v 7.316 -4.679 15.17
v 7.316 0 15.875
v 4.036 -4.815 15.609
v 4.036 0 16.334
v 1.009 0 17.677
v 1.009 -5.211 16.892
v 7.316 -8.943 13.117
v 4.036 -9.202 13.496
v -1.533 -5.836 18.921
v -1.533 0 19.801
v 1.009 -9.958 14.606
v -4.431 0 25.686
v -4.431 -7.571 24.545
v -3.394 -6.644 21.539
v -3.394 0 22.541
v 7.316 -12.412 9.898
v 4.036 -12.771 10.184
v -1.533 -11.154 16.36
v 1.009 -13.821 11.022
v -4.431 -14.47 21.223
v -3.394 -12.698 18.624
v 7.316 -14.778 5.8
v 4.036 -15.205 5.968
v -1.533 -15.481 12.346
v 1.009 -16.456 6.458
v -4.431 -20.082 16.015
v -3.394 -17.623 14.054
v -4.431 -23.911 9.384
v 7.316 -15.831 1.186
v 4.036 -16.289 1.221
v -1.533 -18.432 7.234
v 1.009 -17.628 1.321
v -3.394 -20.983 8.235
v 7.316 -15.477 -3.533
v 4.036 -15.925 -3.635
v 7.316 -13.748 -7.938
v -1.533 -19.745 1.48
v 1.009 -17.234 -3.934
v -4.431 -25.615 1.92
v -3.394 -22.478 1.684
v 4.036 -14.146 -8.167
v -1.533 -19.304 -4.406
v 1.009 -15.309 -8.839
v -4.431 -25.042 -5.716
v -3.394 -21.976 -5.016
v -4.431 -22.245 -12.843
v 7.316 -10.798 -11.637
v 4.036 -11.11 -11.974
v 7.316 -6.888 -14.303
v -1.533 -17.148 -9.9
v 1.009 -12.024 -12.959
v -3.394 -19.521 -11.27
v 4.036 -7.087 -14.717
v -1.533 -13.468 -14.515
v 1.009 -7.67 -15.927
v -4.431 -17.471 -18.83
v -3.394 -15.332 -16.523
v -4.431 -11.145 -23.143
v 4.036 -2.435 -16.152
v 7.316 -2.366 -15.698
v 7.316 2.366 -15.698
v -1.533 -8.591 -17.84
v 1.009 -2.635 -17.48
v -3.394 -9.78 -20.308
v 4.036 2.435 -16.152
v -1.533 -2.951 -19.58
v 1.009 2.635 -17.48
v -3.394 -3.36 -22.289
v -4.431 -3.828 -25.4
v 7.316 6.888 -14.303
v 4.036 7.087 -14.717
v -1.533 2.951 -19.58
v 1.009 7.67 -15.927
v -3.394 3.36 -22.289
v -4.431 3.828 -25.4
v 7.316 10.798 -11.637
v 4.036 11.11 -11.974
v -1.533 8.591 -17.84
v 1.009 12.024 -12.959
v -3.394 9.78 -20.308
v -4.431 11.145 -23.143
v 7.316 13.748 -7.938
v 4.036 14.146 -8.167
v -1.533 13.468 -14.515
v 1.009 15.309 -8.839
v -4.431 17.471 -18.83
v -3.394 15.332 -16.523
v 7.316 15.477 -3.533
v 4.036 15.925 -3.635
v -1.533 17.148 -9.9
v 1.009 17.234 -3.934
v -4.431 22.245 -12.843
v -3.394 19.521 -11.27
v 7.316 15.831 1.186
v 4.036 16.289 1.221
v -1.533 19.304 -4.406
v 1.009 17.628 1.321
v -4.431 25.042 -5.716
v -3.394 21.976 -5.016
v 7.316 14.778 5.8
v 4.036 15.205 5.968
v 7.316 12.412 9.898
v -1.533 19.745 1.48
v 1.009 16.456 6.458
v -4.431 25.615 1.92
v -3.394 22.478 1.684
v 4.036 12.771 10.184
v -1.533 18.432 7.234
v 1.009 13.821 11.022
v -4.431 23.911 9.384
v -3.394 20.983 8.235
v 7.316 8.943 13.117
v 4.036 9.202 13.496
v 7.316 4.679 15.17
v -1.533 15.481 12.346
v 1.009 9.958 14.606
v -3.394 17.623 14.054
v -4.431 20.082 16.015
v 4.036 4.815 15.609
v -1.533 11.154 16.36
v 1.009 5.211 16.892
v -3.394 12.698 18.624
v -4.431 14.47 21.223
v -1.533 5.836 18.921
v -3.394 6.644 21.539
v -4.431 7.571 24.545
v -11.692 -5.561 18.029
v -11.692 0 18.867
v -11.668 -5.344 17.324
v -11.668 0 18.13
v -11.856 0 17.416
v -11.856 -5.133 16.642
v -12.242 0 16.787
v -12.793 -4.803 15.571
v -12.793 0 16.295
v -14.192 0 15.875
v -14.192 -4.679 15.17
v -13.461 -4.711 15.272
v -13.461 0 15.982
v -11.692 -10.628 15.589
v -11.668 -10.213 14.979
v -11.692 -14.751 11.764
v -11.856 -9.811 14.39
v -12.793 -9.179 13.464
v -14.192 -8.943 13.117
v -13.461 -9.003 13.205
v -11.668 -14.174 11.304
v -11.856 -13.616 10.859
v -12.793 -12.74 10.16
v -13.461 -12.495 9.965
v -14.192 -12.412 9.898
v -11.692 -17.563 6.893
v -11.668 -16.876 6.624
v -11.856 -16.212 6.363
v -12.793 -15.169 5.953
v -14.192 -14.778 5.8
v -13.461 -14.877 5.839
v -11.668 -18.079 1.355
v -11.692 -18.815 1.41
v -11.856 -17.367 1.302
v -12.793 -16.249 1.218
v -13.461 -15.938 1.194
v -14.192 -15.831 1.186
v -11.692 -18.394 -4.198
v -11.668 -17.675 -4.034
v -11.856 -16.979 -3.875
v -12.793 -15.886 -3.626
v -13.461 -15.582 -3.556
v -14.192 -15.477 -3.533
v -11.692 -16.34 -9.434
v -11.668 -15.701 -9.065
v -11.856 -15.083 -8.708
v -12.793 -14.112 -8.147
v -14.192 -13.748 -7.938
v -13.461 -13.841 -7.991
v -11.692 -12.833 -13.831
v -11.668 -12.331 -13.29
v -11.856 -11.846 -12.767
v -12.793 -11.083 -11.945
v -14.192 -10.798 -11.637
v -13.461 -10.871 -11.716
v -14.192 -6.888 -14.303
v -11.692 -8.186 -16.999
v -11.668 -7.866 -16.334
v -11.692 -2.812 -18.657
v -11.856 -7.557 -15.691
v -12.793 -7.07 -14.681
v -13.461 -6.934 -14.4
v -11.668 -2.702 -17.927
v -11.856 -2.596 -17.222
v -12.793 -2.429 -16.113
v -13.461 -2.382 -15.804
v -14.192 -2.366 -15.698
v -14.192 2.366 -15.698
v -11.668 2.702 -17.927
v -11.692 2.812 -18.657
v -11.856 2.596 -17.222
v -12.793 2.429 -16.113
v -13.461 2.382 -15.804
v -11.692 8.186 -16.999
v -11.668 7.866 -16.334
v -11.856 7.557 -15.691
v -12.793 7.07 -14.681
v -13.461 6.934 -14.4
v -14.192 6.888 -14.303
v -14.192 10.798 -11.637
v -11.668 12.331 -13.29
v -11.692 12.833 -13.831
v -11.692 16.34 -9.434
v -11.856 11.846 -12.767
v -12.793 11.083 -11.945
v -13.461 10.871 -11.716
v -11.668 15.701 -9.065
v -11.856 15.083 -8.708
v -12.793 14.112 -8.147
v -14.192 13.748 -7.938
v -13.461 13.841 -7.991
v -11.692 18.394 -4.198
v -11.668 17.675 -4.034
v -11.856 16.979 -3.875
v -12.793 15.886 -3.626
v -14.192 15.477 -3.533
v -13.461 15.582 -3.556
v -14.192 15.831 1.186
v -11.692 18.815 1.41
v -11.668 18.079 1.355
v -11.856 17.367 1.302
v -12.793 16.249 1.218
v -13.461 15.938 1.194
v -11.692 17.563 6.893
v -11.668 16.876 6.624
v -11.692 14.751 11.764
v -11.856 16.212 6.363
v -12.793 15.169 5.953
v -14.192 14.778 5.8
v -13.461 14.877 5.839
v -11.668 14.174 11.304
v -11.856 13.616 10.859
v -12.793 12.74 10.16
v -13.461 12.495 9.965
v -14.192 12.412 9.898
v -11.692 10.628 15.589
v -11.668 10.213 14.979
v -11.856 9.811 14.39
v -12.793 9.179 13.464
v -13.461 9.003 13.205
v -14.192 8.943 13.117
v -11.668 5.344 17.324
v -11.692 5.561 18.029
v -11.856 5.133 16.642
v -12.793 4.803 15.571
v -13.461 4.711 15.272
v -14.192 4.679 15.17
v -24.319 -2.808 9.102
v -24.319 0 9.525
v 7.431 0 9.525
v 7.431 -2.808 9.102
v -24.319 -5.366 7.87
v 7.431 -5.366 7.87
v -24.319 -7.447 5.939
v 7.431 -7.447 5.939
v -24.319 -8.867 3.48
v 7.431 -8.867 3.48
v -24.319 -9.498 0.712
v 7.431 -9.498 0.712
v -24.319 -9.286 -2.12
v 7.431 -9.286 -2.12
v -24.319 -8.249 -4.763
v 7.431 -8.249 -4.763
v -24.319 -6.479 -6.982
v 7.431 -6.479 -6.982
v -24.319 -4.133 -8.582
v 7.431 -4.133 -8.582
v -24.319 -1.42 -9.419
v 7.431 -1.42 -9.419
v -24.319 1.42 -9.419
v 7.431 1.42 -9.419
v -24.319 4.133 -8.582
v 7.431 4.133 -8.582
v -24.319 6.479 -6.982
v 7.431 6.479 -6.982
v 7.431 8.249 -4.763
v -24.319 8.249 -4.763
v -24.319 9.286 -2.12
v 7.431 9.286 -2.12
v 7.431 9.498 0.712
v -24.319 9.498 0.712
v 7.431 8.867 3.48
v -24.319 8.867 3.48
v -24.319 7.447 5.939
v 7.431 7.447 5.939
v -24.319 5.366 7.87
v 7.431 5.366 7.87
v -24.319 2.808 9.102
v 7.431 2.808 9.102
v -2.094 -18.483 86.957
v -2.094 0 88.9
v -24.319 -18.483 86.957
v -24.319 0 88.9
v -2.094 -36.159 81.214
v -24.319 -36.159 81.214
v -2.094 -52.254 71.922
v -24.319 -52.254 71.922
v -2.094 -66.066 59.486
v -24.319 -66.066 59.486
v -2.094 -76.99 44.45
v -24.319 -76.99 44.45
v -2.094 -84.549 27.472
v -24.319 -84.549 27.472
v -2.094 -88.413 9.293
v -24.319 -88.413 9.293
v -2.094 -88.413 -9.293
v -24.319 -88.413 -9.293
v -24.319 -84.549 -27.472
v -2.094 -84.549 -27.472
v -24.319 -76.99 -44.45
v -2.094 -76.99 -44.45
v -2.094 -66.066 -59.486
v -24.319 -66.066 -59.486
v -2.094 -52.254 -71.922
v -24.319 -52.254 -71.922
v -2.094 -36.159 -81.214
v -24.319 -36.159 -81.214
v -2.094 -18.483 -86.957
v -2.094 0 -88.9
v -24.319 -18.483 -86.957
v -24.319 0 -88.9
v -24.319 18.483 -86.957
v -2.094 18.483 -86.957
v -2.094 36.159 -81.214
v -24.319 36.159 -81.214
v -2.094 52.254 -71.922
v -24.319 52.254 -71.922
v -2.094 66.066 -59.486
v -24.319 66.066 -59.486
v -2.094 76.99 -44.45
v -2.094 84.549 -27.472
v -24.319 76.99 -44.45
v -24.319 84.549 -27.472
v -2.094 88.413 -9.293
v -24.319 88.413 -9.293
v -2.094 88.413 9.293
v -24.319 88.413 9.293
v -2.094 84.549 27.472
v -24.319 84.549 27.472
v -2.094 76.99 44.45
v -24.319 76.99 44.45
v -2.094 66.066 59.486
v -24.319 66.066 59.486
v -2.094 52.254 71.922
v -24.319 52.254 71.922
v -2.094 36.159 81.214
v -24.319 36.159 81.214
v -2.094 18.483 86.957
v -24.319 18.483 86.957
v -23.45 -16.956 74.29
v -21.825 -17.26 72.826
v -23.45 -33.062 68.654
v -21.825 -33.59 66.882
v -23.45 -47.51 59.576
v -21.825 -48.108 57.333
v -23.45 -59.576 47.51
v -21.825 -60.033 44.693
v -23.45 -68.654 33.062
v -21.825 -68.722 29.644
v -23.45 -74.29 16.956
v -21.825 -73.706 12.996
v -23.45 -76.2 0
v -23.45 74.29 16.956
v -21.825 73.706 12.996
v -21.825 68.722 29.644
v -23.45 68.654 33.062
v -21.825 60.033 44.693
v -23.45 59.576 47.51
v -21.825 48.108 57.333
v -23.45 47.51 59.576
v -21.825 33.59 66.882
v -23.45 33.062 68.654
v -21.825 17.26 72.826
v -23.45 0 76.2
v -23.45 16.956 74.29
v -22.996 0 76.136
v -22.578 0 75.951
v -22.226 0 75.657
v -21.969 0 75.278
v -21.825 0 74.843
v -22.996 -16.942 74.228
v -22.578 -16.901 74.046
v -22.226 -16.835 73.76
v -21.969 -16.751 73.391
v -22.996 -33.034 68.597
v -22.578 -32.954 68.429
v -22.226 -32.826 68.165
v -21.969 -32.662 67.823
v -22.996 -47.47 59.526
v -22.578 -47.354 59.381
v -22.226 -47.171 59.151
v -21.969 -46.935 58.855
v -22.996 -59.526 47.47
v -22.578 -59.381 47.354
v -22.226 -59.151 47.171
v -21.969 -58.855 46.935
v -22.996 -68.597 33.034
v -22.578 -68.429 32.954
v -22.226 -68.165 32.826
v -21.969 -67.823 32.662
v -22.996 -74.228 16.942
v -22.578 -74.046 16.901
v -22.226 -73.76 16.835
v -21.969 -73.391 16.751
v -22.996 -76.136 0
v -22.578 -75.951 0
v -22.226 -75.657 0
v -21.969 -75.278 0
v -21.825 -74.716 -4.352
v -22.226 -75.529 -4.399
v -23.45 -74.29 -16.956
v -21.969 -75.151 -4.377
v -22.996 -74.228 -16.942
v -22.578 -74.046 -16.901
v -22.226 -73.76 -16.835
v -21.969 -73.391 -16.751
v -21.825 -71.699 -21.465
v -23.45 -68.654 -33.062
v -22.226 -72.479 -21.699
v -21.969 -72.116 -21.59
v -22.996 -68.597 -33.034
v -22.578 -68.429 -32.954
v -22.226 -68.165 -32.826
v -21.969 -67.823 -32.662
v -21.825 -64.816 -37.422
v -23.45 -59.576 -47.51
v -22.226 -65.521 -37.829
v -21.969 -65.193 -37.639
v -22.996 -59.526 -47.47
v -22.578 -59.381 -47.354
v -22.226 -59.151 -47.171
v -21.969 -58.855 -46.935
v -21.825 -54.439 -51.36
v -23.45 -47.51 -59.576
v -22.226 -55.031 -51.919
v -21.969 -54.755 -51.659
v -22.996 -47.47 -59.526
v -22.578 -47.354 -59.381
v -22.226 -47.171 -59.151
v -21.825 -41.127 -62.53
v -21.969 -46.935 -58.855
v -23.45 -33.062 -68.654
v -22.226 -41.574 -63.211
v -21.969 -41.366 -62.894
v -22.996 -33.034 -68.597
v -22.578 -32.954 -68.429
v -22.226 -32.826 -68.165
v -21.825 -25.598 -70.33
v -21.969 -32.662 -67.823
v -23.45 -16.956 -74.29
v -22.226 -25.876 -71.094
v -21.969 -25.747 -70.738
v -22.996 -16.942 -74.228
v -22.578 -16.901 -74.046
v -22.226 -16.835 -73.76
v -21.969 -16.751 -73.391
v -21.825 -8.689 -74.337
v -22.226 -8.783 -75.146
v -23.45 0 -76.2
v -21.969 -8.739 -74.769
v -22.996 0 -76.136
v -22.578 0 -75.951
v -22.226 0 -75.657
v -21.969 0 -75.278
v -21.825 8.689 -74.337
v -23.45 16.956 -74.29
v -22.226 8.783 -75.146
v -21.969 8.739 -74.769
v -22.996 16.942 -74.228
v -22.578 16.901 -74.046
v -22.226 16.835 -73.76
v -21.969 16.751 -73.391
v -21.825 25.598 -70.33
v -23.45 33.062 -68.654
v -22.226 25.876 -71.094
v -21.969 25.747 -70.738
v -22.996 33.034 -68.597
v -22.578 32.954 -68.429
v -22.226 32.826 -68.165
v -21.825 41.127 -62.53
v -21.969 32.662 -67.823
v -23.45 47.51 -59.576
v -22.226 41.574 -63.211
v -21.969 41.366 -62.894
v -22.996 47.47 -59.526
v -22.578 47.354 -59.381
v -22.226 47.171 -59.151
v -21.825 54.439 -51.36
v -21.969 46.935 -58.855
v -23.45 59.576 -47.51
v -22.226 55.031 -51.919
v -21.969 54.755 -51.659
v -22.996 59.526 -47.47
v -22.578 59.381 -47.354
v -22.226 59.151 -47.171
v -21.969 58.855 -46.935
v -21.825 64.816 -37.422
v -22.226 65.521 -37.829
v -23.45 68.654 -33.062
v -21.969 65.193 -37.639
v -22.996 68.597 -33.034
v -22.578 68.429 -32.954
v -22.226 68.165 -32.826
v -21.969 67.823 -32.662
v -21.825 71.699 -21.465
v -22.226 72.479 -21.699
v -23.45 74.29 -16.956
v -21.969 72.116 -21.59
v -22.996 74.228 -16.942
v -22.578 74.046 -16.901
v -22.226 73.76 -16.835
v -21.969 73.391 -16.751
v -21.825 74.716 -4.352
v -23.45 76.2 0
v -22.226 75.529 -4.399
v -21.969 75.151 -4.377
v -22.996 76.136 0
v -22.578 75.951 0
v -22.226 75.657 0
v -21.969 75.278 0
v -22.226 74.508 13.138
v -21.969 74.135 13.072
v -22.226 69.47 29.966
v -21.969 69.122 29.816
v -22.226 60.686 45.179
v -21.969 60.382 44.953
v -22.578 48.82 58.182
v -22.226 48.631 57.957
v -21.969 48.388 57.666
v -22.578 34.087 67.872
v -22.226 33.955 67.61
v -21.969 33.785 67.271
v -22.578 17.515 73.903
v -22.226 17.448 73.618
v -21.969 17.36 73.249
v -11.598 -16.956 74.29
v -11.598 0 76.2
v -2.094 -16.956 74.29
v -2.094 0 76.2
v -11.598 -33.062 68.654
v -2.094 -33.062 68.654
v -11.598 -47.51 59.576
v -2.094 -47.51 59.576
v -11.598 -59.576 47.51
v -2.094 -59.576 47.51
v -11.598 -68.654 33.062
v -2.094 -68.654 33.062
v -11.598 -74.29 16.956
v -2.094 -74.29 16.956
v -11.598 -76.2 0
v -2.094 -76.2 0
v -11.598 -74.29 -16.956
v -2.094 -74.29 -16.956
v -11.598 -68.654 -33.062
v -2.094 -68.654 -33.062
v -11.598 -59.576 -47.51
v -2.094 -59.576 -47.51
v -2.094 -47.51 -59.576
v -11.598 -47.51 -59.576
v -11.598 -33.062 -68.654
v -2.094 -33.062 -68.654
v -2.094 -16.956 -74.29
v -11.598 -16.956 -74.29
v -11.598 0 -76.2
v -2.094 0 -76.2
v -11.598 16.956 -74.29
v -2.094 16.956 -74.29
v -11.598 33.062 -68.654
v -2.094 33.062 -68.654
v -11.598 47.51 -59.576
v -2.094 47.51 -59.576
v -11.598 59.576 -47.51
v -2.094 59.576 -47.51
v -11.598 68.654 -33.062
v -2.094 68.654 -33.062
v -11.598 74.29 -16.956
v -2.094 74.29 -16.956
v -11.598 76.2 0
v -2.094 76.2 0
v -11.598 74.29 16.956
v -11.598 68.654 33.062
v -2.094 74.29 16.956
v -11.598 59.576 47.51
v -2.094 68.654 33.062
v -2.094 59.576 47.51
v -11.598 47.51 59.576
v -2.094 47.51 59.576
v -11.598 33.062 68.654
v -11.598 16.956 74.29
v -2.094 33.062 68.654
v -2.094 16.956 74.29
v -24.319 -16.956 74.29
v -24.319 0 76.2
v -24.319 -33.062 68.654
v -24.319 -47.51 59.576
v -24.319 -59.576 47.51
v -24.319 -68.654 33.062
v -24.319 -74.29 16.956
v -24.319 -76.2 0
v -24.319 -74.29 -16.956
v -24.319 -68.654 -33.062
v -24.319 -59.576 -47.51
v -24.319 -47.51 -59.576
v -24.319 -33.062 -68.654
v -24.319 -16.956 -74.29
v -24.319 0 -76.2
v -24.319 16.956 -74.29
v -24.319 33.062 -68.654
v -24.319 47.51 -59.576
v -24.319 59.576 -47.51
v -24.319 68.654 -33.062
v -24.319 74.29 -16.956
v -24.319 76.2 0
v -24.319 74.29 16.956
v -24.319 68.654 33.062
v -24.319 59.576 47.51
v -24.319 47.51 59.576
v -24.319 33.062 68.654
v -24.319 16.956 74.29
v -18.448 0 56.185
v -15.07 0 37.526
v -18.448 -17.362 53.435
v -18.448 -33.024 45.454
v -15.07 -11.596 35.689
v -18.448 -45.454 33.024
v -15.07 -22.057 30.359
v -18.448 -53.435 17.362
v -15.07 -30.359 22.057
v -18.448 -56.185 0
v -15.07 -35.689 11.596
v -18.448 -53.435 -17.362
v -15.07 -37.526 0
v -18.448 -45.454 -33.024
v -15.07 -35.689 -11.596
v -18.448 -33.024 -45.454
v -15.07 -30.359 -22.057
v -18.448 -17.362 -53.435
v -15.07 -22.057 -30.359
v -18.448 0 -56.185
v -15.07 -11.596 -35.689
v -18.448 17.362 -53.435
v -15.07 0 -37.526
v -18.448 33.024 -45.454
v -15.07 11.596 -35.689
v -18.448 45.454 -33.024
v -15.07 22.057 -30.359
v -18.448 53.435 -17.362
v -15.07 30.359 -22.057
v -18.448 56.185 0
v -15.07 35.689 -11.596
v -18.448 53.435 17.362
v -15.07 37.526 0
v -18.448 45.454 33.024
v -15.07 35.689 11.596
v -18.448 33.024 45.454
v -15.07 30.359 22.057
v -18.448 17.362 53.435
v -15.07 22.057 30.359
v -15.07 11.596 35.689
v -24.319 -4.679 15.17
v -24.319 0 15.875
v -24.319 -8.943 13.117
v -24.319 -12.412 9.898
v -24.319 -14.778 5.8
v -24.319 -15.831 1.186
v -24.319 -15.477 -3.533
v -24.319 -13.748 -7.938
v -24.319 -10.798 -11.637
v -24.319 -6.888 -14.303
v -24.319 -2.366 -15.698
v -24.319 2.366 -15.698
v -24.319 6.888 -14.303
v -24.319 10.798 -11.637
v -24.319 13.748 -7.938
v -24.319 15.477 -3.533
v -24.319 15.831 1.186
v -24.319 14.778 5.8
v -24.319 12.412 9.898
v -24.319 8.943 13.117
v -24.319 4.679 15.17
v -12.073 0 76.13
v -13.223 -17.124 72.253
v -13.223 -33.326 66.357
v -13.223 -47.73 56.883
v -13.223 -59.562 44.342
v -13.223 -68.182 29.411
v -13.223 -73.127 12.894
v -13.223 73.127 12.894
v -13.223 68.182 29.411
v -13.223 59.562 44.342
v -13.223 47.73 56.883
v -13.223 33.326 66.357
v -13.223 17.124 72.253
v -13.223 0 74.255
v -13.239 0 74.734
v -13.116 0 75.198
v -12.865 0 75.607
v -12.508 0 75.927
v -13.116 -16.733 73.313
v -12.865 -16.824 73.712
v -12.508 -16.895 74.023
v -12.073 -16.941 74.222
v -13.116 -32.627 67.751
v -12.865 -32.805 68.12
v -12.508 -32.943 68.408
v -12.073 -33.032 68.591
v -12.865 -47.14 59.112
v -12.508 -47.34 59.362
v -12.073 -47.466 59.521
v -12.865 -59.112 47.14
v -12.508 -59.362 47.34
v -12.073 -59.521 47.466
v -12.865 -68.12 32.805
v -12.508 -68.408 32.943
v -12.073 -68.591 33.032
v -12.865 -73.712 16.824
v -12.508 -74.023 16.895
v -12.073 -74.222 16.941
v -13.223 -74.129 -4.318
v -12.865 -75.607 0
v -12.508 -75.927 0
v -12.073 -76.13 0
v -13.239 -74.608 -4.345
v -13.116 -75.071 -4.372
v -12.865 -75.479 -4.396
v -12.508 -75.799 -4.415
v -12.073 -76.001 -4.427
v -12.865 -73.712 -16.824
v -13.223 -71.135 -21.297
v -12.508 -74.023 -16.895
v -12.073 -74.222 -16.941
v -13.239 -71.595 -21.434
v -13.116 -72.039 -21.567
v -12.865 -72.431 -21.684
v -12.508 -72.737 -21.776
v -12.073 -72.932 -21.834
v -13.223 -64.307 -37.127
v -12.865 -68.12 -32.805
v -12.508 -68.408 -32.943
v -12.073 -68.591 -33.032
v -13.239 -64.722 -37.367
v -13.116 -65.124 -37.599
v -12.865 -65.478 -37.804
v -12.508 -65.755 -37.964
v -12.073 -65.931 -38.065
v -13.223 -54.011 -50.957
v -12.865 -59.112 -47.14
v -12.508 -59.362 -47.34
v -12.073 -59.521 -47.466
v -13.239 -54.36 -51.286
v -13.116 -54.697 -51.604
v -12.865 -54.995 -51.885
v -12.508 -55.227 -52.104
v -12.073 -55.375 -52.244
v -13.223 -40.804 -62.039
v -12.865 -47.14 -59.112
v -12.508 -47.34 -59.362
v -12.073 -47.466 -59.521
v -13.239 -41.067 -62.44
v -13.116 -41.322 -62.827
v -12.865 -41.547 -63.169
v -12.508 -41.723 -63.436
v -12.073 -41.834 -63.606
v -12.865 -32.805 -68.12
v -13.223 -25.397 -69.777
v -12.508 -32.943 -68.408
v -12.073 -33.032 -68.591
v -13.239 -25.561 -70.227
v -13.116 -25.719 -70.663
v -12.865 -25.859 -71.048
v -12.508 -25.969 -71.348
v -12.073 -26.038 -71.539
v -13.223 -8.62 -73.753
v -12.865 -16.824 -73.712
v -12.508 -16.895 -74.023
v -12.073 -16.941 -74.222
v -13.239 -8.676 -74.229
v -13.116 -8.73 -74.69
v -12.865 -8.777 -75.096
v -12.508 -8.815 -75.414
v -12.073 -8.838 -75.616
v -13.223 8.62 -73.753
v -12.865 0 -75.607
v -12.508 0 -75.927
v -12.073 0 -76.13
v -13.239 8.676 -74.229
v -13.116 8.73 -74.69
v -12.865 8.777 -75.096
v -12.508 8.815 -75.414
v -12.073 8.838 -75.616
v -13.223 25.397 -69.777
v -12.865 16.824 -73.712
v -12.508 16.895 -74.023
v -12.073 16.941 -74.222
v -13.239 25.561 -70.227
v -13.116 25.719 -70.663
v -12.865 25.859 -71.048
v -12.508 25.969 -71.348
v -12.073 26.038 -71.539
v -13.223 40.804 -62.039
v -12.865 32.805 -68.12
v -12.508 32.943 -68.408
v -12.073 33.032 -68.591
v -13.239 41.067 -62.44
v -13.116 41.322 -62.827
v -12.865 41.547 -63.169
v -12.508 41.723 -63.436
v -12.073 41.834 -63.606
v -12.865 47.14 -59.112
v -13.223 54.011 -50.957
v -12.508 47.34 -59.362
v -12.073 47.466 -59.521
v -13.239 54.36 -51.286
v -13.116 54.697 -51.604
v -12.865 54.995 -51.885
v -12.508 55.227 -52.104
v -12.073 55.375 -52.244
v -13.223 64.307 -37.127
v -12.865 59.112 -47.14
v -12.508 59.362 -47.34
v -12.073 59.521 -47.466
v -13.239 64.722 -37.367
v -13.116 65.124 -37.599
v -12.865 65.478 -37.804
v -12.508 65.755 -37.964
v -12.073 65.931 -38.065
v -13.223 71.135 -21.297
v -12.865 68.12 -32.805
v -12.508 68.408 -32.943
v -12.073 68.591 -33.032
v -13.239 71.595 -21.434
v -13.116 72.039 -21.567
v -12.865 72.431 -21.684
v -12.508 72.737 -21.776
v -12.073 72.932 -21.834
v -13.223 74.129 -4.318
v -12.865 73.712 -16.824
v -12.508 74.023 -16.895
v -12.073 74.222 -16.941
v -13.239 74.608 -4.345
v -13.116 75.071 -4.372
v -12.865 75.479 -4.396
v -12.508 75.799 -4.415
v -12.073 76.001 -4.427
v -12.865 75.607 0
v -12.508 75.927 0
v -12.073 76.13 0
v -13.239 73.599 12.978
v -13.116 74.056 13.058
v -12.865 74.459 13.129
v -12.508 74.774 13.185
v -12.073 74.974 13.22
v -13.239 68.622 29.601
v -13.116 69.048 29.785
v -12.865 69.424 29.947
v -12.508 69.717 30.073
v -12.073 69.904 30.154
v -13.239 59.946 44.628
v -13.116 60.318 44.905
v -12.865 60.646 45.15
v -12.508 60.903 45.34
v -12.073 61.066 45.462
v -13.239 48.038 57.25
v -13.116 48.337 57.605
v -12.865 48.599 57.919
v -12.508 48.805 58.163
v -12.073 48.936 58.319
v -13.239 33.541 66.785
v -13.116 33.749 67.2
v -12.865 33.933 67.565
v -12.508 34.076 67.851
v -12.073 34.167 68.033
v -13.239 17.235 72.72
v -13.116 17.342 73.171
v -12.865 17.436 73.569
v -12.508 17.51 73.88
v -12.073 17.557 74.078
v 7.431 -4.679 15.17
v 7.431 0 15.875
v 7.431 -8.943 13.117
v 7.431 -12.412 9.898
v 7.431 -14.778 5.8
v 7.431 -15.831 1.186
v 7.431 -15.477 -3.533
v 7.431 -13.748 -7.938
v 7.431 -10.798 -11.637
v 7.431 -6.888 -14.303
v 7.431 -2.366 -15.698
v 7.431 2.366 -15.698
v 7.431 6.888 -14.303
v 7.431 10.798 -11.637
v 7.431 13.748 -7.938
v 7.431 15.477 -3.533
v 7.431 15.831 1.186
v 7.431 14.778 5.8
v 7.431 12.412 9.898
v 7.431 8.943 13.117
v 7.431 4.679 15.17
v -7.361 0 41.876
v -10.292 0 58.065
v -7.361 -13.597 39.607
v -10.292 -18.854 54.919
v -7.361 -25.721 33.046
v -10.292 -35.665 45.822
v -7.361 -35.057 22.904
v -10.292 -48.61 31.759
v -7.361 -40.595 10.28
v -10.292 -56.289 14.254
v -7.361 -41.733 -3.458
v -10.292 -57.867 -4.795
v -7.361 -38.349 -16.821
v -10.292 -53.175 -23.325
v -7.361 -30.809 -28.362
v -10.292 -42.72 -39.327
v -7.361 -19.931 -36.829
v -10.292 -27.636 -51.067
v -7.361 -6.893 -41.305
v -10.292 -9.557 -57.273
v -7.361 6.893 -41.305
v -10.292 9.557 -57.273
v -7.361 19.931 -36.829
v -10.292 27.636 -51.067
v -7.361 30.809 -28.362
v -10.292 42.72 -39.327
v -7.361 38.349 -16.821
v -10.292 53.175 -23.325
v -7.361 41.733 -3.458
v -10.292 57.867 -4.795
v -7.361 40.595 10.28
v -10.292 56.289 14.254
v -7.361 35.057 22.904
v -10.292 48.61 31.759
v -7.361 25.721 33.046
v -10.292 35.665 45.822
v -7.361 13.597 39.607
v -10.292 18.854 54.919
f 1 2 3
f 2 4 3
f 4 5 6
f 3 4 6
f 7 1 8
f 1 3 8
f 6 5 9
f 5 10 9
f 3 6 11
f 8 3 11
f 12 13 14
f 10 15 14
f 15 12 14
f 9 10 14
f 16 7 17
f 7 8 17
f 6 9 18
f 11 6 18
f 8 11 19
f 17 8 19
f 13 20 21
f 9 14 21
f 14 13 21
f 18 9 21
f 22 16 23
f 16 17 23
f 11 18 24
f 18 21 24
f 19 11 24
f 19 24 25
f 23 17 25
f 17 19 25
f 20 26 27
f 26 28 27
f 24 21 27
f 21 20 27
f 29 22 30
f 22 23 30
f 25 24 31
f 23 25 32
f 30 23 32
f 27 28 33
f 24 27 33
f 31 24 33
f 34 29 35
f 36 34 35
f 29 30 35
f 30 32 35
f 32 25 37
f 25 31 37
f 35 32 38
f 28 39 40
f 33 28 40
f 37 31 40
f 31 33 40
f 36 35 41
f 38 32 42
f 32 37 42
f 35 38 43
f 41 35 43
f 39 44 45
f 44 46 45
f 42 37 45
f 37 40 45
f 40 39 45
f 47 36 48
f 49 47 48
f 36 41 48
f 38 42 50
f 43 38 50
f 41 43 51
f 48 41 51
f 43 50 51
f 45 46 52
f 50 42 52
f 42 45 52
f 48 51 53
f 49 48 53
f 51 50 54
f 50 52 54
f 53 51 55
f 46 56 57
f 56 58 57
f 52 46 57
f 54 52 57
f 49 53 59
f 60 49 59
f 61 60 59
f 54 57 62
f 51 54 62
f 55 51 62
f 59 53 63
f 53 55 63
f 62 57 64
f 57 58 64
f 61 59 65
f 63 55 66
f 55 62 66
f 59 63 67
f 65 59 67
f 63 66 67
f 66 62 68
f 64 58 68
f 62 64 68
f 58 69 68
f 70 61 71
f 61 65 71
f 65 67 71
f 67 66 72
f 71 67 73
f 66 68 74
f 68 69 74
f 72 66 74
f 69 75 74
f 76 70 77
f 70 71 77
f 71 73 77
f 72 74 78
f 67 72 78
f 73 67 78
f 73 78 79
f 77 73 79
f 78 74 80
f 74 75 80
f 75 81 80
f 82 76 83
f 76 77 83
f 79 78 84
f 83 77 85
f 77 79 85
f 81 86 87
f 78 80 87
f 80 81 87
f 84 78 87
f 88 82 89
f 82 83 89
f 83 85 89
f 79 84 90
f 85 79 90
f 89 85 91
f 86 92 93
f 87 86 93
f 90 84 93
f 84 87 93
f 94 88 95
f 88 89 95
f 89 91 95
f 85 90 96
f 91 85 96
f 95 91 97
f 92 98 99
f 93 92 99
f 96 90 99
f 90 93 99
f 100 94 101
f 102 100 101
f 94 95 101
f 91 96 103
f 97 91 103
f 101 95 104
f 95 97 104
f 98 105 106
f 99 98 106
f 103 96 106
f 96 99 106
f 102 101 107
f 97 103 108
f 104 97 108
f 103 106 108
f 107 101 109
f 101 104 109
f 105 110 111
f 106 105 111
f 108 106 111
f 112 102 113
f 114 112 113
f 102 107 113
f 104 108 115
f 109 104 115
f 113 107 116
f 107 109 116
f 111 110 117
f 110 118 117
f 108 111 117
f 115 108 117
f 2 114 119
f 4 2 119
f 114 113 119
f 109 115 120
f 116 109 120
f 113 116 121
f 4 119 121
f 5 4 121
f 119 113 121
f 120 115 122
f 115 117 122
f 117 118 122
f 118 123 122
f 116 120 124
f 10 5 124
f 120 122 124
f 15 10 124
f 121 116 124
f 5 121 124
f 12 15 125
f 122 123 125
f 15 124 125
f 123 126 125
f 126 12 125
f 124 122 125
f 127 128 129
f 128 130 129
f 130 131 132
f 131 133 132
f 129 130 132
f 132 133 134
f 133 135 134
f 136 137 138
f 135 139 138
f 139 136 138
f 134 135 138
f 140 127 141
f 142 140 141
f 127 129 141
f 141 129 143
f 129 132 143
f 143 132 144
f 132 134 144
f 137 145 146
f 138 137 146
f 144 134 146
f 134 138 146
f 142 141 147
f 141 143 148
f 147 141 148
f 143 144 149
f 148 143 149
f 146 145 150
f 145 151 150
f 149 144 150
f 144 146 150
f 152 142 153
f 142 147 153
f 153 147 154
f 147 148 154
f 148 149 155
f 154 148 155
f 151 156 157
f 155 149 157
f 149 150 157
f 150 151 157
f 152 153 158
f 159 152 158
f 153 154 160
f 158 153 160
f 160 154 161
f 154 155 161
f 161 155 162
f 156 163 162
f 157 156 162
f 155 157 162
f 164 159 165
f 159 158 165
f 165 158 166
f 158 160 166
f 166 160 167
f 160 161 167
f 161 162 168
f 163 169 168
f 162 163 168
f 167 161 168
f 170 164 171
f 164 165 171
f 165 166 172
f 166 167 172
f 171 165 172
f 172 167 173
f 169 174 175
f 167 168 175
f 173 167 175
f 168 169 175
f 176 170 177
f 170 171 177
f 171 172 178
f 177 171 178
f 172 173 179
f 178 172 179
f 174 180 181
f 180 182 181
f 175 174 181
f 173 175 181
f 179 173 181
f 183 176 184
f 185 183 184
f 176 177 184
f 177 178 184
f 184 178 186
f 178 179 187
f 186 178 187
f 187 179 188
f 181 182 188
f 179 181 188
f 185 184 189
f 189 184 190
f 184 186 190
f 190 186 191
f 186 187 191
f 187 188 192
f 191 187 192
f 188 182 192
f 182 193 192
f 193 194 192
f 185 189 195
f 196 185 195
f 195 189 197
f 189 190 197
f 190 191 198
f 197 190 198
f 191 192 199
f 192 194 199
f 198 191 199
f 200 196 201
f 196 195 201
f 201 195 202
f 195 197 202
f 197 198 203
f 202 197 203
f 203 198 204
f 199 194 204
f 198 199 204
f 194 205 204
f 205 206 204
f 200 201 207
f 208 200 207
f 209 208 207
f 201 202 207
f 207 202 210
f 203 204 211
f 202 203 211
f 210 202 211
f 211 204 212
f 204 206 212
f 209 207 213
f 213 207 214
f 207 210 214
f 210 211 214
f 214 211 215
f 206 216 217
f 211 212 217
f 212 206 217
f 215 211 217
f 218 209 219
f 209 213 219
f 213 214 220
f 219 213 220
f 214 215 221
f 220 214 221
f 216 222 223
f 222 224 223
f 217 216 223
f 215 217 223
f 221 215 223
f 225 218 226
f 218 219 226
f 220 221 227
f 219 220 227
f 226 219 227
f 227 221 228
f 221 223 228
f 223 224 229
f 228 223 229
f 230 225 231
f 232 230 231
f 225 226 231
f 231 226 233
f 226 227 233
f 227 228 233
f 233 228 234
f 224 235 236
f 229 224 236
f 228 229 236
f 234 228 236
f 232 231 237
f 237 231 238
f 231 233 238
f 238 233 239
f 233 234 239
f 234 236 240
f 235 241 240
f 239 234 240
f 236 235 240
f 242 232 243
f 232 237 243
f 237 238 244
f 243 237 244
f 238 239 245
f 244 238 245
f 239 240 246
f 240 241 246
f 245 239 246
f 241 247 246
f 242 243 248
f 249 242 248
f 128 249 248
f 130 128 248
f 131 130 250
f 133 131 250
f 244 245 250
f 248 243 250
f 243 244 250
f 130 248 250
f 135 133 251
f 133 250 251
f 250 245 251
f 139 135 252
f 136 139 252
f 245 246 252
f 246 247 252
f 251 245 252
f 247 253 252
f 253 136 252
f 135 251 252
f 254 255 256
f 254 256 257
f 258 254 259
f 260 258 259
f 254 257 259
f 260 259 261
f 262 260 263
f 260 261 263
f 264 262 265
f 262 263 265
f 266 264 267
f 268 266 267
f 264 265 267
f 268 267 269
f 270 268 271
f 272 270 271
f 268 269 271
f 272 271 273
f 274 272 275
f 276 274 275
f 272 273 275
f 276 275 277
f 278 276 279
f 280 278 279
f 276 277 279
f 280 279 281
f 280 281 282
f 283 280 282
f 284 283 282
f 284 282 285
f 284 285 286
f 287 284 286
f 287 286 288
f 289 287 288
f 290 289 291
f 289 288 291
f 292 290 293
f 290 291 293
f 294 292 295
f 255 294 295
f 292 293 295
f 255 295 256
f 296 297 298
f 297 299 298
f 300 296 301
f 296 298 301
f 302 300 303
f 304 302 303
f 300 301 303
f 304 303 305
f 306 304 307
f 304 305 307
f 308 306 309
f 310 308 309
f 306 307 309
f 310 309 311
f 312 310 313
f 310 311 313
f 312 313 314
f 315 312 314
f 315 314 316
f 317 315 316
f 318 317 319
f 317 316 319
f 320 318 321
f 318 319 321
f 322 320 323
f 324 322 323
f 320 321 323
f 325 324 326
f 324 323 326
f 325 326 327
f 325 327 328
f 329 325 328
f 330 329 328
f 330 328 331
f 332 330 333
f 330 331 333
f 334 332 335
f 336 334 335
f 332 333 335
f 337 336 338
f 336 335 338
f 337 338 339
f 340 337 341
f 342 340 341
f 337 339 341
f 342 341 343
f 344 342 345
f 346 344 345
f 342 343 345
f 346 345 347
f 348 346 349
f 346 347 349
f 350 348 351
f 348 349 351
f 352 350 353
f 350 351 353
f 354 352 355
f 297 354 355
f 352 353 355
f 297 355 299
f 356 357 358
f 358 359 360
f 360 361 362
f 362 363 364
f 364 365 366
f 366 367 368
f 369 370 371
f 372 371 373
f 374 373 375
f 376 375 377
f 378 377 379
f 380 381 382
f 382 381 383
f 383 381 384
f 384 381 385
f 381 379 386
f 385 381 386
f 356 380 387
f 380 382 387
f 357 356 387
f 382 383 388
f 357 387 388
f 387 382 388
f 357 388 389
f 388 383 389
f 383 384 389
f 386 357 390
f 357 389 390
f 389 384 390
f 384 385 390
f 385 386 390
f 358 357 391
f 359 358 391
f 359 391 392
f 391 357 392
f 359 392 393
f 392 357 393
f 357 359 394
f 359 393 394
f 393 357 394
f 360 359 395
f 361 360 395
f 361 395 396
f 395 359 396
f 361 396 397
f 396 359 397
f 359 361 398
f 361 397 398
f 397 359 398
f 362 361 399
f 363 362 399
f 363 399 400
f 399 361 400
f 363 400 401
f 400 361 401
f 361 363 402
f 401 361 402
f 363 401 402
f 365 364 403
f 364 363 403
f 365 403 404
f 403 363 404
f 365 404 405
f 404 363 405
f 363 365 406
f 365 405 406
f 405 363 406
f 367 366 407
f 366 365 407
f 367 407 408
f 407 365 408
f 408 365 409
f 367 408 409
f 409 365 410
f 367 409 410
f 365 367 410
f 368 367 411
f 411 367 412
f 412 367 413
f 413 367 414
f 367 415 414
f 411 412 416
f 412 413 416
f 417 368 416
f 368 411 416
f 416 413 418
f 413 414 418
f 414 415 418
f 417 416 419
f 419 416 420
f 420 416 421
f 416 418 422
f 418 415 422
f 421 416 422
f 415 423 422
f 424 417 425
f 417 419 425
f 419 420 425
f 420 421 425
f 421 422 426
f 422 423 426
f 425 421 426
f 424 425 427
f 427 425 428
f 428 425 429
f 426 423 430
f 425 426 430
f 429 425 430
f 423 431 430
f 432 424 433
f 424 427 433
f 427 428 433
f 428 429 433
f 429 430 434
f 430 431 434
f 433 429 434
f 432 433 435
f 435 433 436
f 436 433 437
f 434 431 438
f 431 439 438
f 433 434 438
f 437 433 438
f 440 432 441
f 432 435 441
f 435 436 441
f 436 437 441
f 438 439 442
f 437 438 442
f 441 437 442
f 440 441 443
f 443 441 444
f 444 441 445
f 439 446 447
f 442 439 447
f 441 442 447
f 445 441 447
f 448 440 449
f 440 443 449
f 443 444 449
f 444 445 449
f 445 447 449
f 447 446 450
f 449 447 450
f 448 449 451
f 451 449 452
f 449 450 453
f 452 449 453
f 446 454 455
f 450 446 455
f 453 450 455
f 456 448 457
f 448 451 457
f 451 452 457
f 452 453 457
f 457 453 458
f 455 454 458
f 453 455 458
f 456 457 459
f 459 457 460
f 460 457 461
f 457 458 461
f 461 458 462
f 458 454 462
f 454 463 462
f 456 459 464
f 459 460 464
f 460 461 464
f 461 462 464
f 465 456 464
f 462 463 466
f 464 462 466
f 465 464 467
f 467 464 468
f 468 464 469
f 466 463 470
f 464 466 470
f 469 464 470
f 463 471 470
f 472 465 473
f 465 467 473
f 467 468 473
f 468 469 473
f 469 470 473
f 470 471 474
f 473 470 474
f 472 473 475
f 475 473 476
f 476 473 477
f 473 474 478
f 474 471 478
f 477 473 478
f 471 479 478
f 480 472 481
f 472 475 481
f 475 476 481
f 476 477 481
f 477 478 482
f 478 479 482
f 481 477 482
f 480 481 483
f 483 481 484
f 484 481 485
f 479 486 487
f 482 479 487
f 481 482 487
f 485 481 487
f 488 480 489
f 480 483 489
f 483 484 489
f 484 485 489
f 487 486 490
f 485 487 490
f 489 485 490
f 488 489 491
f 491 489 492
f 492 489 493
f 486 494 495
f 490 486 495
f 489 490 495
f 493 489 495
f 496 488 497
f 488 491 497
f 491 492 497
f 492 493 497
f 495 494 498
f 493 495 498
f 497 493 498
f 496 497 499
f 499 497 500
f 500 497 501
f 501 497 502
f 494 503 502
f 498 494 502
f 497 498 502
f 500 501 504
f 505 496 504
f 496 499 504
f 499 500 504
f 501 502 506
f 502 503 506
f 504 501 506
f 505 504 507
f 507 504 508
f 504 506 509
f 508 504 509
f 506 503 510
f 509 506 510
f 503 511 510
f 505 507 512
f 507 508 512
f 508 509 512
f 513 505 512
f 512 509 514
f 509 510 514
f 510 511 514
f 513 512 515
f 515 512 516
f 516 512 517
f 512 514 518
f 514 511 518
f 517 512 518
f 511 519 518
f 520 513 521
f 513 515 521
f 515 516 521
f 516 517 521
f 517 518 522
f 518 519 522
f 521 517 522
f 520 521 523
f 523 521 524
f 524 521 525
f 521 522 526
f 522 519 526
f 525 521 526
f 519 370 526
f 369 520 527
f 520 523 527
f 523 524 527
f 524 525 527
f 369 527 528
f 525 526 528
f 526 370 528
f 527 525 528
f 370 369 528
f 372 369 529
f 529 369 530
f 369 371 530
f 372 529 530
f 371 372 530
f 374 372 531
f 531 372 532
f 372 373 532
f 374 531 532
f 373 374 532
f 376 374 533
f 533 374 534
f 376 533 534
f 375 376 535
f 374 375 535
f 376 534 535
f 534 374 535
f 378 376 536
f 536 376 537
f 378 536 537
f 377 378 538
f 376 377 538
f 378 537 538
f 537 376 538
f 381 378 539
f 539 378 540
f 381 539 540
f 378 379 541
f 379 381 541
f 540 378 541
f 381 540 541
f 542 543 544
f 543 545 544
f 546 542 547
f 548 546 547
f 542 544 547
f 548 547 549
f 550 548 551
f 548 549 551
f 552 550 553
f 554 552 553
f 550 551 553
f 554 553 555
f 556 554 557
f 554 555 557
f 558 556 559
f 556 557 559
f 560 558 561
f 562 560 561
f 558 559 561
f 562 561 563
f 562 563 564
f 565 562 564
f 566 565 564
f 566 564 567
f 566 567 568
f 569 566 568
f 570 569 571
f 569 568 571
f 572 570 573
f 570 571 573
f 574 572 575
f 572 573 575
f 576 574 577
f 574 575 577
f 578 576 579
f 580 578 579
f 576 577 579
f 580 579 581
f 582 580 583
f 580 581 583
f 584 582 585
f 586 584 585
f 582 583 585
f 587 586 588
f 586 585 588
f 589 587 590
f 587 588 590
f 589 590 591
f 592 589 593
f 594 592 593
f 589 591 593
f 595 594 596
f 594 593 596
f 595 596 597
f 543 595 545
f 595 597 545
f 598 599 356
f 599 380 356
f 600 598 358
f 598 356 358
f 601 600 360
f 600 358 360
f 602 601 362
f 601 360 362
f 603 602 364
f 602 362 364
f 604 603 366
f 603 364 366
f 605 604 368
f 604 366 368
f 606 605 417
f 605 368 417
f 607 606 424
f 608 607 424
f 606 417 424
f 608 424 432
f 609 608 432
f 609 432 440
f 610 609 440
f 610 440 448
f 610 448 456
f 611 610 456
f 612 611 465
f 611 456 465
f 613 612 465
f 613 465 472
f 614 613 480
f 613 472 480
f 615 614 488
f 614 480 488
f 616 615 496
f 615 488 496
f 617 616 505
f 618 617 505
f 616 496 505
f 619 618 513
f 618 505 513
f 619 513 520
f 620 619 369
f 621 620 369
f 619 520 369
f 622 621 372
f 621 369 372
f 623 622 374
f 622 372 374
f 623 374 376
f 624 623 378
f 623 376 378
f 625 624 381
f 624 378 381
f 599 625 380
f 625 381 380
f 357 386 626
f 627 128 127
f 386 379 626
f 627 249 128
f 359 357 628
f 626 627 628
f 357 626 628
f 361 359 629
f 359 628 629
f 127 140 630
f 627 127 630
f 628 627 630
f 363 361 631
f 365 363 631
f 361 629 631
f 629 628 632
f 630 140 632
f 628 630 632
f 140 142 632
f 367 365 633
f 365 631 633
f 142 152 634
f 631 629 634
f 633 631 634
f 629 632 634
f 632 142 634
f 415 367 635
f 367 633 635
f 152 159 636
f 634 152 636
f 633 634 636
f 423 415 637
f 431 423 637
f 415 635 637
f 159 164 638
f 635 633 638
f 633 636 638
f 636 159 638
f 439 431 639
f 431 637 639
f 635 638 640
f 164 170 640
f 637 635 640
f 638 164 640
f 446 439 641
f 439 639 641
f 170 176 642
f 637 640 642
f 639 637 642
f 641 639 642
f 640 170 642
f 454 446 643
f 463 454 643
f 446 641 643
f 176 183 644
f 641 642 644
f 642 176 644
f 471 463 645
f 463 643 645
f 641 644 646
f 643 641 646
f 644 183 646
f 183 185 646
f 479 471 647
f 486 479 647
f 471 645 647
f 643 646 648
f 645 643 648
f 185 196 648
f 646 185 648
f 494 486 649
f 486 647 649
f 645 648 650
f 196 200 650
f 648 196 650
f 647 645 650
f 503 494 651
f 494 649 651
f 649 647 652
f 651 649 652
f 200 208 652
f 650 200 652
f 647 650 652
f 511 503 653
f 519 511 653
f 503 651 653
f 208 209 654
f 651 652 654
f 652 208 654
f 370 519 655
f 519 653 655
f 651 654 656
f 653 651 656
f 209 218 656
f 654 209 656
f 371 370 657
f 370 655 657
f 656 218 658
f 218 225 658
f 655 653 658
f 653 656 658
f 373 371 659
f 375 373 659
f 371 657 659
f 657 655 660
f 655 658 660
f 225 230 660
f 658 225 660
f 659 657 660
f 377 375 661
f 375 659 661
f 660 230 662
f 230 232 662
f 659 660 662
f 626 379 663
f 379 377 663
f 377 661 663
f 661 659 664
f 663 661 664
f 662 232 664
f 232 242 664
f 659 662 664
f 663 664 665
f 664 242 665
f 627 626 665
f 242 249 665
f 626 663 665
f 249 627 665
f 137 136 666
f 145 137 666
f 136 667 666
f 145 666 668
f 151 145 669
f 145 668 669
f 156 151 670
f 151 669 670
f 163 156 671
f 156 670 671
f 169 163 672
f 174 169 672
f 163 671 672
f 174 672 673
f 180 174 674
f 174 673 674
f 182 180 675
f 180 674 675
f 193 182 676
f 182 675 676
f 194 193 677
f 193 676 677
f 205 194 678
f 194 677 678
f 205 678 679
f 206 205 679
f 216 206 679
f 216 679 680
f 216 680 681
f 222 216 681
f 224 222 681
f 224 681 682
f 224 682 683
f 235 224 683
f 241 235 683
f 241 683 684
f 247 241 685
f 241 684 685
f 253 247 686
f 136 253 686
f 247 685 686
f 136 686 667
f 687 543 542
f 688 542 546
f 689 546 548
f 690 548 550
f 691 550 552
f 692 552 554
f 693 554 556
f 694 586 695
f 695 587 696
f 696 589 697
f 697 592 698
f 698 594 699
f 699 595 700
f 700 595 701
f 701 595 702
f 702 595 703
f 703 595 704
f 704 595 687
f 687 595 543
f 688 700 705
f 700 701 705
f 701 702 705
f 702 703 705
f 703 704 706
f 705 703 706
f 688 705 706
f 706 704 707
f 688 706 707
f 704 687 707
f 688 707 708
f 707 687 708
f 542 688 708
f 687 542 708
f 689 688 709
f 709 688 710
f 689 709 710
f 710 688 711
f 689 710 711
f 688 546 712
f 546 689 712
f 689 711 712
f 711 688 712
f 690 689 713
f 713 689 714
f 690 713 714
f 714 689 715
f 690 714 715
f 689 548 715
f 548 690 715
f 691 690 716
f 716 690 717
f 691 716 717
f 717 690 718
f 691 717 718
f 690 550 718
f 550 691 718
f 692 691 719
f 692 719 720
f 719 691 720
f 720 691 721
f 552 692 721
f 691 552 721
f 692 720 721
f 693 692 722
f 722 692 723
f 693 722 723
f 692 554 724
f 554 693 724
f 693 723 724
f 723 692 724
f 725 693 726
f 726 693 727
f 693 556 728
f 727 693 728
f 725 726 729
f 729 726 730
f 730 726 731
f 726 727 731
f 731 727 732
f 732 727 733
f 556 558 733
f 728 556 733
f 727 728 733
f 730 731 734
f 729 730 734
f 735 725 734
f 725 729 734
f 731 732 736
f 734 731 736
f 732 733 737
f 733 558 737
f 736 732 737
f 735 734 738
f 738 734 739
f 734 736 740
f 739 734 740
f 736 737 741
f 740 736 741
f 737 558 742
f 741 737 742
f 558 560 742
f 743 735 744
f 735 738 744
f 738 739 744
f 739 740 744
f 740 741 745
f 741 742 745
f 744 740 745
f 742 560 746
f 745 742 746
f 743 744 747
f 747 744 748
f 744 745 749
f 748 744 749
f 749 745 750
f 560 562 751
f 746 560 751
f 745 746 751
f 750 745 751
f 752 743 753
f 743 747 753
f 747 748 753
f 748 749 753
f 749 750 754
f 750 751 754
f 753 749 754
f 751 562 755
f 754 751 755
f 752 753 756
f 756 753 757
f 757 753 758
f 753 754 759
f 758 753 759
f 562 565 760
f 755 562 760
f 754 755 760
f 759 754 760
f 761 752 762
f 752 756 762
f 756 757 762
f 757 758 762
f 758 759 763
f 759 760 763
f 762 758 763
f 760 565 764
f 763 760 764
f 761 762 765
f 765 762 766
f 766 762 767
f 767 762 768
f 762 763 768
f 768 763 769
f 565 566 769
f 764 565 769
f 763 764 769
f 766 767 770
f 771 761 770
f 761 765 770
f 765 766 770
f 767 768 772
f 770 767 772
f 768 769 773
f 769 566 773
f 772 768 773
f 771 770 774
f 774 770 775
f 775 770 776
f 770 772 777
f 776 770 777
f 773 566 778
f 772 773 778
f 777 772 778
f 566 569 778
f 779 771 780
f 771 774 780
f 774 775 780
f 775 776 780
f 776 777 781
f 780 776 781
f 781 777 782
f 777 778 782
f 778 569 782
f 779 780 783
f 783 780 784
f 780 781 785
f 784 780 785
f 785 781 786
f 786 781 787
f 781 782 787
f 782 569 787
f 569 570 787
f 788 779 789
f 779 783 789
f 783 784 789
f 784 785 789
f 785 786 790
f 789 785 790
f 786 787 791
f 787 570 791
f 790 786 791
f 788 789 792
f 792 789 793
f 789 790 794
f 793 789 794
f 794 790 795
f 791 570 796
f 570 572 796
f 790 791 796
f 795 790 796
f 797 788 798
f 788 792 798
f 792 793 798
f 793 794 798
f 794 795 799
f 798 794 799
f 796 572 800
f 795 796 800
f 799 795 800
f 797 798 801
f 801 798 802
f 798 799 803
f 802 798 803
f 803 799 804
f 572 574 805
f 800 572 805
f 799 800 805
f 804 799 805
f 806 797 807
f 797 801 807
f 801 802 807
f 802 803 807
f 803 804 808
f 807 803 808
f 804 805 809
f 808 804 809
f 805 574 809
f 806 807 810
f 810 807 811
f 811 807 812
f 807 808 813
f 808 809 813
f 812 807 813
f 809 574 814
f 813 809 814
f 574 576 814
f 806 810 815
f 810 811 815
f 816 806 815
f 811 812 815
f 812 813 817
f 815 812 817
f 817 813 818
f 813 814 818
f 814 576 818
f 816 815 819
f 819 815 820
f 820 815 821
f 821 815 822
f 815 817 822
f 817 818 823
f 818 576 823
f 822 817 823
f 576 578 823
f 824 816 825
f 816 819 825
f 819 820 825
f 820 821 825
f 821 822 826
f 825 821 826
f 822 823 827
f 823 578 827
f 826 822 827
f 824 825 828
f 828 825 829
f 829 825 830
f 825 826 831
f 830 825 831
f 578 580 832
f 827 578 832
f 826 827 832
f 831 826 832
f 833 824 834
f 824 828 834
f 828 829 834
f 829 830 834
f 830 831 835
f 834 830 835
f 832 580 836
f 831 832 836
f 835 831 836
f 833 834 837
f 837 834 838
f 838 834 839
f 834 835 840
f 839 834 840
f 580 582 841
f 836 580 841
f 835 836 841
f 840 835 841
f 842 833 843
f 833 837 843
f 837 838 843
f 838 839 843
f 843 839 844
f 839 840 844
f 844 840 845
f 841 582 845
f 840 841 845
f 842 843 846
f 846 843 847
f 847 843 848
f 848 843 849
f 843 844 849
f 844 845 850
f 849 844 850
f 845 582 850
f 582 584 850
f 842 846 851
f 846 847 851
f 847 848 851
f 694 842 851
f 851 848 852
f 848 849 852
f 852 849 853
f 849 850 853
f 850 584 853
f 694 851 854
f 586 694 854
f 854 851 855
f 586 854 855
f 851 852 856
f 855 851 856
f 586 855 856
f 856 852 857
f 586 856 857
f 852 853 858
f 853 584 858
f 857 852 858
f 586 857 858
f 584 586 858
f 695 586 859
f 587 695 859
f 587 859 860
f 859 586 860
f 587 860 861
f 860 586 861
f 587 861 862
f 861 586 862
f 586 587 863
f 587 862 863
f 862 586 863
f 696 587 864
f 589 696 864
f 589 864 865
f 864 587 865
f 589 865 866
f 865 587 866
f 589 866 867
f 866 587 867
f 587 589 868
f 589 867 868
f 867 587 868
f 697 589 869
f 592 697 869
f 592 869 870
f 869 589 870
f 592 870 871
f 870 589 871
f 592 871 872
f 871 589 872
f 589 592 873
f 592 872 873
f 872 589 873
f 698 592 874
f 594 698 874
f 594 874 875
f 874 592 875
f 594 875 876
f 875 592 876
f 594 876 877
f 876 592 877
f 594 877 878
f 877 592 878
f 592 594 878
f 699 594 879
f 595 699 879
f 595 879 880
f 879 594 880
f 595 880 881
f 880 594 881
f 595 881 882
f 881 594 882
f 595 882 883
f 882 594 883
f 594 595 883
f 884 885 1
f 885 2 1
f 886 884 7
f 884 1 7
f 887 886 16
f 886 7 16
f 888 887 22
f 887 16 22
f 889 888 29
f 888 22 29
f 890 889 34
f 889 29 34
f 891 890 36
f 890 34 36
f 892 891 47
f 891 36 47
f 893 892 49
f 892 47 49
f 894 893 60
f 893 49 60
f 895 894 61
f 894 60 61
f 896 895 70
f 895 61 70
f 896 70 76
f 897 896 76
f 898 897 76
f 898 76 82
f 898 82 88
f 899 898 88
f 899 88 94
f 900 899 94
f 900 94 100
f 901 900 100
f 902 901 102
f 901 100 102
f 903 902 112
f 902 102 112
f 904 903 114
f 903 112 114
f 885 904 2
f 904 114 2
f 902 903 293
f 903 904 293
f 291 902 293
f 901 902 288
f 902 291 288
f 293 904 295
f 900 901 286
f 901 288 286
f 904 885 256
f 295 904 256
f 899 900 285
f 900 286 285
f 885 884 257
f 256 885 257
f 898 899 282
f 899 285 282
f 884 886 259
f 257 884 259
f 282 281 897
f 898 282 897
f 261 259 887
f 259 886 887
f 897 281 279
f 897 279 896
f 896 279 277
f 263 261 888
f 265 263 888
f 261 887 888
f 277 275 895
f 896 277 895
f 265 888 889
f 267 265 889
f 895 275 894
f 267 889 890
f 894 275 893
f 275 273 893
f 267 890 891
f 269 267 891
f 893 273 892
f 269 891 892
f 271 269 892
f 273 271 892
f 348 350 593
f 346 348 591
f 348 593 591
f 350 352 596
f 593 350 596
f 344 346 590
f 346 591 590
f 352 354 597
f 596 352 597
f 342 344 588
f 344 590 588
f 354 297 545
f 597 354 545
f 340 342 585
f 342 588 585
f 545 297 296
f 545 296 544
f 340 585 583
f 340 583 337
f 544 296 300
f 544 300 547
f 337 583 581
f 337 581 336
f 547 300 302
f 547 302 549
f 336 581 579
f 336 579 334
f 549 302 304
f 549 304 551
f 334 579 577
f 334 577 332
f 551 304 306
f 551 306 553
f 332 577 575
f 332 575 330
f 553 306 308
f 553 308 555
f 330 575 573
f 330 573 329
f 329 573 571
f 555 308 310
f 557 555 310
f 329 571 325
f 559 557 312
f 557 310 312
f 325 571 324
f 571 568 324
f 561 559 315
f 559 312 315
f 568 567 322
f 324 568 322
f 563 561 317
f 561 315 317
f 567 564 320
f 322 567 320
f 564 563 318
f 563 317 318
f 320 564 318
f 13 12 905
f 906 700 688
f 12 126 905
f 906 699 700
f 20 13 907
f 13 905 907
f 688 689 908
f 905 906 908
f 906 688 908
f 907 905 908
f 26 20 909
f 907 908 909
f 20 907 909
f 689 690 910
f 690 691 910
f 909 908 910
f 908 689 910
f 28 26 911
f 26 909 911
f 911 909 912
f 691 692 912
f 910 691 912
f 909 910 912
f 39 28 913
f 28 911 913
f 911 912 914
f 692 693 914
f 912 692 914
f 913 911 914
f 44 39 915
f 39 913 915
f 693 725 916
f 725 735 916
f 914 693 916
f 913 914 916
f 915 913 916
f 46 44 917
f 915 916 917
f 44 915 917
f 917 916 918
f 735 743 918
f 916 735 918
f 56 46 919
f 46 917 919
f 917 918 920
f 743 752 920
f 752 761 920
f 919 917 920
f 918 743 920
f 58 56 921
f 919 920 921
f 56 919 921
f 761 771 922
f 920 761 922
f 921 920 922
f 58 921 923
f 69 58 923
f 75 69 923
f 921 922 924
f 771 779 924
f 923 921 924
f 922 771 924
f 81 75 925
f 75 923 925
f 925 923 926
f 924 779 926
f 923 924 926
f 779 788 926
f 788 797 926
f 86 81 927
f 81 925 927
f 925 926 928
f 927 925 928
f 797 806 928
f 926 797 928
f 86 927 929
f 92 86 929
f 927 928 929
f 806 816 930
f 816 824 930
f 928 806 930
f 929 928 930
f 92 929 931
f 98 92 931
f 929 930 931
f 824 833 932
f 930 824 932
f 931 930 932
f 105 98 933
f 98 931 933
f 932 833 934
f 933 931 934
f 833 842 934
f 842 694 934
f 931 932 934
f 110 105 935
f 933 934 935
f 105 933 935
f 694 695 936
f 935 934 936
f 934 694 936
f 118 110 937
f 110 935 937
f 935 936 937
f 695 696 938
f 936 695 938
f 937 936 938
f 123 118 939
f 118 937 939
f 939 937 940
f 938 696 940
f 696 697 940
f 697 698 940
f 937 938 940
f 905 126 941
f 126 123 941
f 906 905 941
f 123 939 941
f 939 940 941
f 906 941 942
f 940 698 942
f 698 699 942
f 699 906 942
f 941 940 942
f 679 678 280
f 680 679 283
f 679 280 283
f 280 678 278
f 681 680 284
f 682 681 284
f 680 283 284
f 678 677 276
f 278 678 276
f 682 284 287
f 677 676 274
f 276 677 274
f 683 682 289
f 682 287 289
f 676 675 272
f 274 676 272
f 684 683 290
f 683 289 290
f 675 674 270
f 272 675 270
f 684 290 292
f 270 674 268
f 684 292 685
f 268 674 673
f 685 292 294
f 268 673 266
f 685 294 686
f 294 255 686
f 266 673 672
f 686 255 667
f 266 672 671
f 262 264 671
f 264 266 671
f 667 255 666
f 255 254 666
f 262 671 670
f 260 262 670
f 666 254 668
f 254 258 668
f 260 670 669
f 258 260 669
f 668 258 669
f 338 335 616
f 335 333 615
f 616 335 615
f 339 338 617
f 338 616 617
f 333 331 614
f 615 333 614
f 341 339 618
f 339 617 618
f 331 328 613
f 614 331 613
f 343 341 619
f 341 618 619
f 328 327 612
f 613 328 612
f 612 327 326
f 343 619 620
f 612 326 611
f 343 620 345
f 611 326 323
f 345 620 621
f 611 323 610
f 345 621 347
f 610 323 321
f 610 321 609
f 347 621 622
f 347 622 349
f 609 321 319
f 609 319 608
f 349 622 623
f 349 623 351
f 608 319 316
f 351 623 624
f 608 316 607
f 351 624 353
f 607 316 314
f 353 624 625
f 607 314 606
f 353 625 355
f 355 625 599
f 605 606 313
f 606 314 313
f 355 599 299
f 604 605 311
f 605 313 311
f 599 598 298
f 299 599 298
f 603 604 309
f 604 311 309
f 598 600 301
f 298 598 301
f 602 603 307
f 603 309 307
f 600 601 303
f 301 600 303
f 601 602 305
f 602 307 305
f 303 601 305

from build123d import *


with BuildPart() as part:
    # Sketch2 → Revolve1 (revolve)
    with BuildSketch(Plane.XY, mode=Mode.PRIVATE) as revolve1_sk:
        with BuildLine():
            Line((-24.319148936, 9.525), (7.430851064, 9.525))
            Line((7.430851064, 9.525), (7.430851064, 15.875))
            Line((7.430851064, 15.875), (7.316402096, 15.875))
            ThreePointArc((7.316402096, 15.875), (-0.336356408, 18.650515004), (-4.430671947, 25.686478088))
            Line((-4.430671947, 25.686478088), (-13.222804096, 74.254906544))
            ThreePointArc((-13.222804096, 74.254906544), (-12.86536093, 75.607360219), (-11.59820875, 76.2))
            Line((-11.59820875, 76.2), (-2.094148936, 76.2))
            Line((-2.094148936, 76.2), (-2.094148936, 88.9))
            Line((-2.094148936, 88.9), (-24.319148936, 88.9))
            Line((-24.319148936, 88.9), (-24.319148936, 76.2))
            Line((-24.319148936, 76.2), (-23.449860757, 76.2))
            ThreePointArc((-23.449860757, 76.2), (-22.391500538, 75.81615218), (-21.82526541, 74.843093456))
            Line((-21.82526541, 74.843093456), (-11.692237493, 18.867451471))
            ThreePointArc((-11.692237493, 18.867451471), (-12.242150056, 16.78675351), (-14.191614948, 15.875))
            Line((-14.191614948, 15.875), (-24.319148936, 15.875))
            Line((-24.319148936, 15.875), (-24.319148936, 9.525))
        make_face()
    revolve(revolve1_sk.sketch.rotate(Axis((-25.028457447, 0, 0), (1, 0, 0)), 90), axis=Axis((-25.028457447, 0, 0), (1, 0, 0)))


solid = part.part
